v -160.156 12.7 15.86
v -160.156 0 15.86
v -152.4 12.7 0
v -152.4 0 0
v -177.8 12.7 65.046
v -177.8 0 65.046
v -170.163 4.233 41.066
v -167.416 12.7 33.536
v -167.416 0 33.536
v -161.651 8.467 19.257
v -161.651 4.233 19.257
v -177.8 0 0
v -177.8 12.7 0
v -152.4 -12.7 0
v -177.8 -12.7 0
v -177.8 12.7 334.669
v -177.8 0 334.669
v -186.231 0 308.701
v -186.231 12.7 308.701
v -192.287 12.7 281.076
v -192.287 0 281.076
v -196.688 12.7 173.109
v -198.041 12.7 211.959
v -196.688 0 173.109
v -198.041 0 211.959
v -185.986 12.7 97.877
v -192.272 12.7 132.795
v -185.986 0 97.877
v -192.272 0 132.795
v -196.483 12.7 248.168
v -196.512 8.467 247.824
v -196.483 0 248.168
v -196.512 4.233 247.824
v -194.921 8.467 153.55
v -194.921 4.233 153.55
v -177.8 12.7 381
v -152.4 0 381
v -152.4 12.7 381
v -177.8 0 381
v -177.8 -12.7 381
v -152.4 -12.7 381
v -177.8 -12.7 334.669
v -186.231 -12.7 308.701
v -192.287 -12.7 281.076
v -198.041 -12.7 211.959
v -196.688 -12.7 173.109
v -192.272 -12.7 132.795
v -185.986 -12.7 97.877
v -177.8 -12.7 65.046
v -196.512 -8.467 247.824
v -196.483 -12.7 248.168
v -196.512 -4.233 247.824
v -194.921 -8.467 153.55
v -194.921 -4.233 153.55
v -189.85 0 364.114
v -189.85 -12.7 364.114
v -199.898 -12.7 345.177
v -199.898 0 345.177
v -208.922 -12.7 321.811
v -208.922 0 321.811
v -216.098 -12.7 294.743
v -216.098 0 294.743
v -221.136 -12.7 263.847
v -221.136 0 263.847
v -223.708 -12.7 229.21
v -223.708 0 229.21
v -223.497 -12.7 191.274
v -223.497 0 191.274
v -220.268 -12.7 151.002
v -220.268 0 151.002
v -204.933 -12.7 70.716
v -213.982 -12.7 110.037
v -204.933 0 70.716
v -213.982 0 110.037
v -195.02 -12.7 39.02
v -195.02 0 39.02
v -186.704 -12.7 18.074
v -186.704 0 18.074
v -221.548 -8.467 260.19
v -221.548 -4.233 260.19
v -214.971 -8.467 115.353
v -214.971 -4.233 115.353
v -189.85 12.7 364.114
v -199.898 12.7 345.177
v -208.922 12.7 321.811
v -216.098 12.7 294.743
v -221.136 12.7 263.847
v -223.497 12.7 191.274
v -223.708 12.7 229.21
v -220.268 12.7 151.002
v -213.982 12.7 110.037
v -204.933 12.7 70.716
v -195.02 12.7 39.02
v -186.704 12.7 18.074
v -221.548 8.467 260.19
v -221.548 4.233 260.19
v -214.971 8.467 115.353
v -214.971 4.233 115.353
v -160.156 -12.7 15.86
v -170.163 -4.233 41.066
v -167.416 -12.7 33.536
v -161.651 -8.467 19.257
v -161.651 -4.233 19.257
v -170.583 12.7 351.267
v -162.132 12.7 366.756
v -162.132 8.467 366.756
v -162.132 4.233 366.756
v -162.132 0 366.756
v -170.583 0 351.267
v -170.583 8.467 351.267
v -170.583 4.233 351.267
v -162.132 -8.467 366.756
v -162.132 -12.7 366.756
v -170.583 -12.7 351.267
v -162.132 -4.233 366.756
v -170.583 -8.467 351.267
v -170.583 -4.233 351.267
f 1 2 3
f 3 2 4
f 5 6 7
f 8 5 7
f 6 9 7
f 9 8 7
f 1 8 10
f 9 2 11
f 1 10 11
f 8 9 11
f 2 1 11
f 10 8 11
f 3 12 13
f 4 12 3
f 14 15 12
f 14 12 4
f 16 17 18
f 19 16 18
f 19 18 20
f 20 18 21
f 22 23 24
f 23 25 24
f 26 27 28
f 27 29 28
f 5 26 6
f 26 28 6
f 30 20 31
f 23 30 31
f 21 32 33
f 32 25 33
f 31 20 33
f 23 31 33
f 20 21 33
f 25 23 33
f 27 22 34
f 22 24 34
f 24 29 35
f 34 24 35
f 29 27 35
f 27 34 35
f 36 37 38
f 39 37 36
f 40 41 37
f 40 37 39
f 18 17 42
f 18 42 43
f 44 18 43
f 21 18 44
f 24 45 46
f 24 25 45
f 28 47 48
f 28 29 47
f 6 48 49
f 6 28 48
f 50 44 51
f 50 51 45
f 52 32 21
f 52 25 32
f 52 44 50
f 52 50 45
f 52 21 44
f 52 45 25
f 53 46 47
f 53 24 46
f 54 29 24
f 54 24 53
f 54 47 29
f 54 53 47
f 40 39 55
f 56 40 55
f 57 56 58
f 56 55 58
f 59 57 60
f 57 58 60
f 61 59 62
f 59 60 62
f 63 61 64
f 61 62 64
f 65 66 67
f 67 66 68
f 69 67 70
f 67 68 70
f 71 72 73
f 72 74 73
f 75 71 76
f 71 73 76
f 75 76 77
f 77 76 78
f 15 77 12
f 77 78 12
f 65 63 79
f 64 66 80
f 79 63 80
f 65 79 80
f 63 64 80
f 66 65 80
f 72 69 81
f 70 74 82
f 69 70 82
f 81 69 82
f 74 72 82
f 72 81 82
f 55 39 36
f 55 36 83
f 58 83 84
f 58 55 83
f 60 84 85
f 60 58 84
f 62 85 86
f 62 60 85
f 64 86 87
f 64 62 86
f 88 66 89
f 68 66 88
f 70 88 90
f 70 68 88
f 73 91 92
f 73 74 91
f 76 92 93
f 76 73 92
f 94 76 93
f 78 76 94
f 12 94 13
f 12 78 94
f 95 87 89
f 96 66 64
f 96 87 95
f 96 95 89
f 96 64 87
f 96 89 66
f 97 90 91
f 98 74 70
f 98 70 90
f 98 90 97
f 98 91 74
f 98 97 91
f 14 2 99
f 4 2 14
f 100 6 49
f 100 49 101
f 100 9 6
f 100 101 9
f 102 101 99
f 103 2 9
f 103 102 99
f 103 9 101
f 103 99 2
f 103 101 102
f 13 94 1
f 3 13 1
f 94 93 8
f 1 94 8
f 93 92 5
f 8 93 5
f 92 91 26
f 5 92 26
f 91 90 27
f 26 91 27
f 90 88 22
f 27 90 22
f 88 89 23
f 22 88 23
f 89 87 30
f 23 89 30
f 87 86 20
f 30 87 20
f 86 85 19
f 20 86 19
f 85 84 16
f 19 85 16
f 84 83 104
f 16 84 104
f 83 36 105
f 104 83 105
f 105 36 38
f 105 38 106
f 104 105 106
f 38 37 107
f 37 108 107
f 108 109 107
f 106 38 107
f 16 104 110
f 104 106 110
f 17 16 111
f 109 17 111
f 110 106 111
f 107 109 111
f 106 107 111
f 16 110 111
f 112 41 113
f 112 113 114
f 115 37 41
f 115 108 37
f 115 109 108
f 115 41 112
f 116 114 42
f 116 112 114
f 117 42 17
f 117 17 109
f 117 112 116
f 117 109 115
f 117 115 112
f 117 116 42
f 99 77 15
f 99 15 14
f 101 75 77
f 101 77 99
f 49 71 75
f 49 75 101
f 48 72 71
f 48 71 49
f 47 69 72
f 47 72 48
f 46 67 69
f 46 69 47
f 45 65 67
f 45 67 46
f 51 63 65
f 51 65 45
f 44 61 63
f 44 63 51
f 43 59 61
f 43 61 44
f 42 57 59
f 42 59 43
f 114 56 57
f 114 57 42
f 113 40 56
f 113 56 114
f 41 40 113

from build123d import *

# Parameters (mm, degrees)
F1_DEPTH = 12.7


with BuildPart() as f1:
    # F0 (on Front) → F1 (new body, symmetric)
    with BuildSketch(Plane.XZ):
        with BuildLine():
            Line((-152.4, 381), (-177.8, 381))
            Line((-177.8, 381), (-177.8, 334.669267))
            add(Edge.make_bspline(
                [(-152.4, 381), (-162.789444, 367.423679), (-171.182667, 351.776967), (-177.8, 334.669267)],
                knots=[0, 0, 0, 0, 54.311283, 54.311283, 54.311283, 54.311283], degree=3))
        make_face()
        with BuildLine():
            Line((-177.8, 65.045732), (-177.8, 0))
            Line((-177.8, 0), (-152.4, 0))
            add(Edge.make_bspline(
                [(-177.8, 65.045732), (-170.647414, 40.108141), (-161.973539, 17.853119), (-152.4, 0)],
                knots=[304.256369, 304.256369, 304.256369, 304.256369, 381, 381, 381, 381], degree=3))
        make_face()
        with BuildLine():
            Line((-177.8, 334.669267), (-177.8, 381))
            add(Edge.make_bspline(
                [(-177.8, 381), (-253.287822, 290.041178), (-223.691106, 82.773164), (-177.8, 0)],
                knots=[0, 0, 0, 0, 381, 381, 381, 381], degree=3))
            Line((-177.8, 0), (-177.8, 65.045732))
            add(Edge.make_bspline(
                [(-177.8, 334.669267), (-208.253521, 255.938191), (-201.095141, 146.264566), (-177.8, 65.045732)],
                knots=[54.311283, 54.311283, 54.311283, 54.311283, 304.256369, 304.256369, 304.256369, 304.256369], degree=3))
        make_face()
    extrude(amount=F1_DEPTH, both=True)


solid = f1.part
